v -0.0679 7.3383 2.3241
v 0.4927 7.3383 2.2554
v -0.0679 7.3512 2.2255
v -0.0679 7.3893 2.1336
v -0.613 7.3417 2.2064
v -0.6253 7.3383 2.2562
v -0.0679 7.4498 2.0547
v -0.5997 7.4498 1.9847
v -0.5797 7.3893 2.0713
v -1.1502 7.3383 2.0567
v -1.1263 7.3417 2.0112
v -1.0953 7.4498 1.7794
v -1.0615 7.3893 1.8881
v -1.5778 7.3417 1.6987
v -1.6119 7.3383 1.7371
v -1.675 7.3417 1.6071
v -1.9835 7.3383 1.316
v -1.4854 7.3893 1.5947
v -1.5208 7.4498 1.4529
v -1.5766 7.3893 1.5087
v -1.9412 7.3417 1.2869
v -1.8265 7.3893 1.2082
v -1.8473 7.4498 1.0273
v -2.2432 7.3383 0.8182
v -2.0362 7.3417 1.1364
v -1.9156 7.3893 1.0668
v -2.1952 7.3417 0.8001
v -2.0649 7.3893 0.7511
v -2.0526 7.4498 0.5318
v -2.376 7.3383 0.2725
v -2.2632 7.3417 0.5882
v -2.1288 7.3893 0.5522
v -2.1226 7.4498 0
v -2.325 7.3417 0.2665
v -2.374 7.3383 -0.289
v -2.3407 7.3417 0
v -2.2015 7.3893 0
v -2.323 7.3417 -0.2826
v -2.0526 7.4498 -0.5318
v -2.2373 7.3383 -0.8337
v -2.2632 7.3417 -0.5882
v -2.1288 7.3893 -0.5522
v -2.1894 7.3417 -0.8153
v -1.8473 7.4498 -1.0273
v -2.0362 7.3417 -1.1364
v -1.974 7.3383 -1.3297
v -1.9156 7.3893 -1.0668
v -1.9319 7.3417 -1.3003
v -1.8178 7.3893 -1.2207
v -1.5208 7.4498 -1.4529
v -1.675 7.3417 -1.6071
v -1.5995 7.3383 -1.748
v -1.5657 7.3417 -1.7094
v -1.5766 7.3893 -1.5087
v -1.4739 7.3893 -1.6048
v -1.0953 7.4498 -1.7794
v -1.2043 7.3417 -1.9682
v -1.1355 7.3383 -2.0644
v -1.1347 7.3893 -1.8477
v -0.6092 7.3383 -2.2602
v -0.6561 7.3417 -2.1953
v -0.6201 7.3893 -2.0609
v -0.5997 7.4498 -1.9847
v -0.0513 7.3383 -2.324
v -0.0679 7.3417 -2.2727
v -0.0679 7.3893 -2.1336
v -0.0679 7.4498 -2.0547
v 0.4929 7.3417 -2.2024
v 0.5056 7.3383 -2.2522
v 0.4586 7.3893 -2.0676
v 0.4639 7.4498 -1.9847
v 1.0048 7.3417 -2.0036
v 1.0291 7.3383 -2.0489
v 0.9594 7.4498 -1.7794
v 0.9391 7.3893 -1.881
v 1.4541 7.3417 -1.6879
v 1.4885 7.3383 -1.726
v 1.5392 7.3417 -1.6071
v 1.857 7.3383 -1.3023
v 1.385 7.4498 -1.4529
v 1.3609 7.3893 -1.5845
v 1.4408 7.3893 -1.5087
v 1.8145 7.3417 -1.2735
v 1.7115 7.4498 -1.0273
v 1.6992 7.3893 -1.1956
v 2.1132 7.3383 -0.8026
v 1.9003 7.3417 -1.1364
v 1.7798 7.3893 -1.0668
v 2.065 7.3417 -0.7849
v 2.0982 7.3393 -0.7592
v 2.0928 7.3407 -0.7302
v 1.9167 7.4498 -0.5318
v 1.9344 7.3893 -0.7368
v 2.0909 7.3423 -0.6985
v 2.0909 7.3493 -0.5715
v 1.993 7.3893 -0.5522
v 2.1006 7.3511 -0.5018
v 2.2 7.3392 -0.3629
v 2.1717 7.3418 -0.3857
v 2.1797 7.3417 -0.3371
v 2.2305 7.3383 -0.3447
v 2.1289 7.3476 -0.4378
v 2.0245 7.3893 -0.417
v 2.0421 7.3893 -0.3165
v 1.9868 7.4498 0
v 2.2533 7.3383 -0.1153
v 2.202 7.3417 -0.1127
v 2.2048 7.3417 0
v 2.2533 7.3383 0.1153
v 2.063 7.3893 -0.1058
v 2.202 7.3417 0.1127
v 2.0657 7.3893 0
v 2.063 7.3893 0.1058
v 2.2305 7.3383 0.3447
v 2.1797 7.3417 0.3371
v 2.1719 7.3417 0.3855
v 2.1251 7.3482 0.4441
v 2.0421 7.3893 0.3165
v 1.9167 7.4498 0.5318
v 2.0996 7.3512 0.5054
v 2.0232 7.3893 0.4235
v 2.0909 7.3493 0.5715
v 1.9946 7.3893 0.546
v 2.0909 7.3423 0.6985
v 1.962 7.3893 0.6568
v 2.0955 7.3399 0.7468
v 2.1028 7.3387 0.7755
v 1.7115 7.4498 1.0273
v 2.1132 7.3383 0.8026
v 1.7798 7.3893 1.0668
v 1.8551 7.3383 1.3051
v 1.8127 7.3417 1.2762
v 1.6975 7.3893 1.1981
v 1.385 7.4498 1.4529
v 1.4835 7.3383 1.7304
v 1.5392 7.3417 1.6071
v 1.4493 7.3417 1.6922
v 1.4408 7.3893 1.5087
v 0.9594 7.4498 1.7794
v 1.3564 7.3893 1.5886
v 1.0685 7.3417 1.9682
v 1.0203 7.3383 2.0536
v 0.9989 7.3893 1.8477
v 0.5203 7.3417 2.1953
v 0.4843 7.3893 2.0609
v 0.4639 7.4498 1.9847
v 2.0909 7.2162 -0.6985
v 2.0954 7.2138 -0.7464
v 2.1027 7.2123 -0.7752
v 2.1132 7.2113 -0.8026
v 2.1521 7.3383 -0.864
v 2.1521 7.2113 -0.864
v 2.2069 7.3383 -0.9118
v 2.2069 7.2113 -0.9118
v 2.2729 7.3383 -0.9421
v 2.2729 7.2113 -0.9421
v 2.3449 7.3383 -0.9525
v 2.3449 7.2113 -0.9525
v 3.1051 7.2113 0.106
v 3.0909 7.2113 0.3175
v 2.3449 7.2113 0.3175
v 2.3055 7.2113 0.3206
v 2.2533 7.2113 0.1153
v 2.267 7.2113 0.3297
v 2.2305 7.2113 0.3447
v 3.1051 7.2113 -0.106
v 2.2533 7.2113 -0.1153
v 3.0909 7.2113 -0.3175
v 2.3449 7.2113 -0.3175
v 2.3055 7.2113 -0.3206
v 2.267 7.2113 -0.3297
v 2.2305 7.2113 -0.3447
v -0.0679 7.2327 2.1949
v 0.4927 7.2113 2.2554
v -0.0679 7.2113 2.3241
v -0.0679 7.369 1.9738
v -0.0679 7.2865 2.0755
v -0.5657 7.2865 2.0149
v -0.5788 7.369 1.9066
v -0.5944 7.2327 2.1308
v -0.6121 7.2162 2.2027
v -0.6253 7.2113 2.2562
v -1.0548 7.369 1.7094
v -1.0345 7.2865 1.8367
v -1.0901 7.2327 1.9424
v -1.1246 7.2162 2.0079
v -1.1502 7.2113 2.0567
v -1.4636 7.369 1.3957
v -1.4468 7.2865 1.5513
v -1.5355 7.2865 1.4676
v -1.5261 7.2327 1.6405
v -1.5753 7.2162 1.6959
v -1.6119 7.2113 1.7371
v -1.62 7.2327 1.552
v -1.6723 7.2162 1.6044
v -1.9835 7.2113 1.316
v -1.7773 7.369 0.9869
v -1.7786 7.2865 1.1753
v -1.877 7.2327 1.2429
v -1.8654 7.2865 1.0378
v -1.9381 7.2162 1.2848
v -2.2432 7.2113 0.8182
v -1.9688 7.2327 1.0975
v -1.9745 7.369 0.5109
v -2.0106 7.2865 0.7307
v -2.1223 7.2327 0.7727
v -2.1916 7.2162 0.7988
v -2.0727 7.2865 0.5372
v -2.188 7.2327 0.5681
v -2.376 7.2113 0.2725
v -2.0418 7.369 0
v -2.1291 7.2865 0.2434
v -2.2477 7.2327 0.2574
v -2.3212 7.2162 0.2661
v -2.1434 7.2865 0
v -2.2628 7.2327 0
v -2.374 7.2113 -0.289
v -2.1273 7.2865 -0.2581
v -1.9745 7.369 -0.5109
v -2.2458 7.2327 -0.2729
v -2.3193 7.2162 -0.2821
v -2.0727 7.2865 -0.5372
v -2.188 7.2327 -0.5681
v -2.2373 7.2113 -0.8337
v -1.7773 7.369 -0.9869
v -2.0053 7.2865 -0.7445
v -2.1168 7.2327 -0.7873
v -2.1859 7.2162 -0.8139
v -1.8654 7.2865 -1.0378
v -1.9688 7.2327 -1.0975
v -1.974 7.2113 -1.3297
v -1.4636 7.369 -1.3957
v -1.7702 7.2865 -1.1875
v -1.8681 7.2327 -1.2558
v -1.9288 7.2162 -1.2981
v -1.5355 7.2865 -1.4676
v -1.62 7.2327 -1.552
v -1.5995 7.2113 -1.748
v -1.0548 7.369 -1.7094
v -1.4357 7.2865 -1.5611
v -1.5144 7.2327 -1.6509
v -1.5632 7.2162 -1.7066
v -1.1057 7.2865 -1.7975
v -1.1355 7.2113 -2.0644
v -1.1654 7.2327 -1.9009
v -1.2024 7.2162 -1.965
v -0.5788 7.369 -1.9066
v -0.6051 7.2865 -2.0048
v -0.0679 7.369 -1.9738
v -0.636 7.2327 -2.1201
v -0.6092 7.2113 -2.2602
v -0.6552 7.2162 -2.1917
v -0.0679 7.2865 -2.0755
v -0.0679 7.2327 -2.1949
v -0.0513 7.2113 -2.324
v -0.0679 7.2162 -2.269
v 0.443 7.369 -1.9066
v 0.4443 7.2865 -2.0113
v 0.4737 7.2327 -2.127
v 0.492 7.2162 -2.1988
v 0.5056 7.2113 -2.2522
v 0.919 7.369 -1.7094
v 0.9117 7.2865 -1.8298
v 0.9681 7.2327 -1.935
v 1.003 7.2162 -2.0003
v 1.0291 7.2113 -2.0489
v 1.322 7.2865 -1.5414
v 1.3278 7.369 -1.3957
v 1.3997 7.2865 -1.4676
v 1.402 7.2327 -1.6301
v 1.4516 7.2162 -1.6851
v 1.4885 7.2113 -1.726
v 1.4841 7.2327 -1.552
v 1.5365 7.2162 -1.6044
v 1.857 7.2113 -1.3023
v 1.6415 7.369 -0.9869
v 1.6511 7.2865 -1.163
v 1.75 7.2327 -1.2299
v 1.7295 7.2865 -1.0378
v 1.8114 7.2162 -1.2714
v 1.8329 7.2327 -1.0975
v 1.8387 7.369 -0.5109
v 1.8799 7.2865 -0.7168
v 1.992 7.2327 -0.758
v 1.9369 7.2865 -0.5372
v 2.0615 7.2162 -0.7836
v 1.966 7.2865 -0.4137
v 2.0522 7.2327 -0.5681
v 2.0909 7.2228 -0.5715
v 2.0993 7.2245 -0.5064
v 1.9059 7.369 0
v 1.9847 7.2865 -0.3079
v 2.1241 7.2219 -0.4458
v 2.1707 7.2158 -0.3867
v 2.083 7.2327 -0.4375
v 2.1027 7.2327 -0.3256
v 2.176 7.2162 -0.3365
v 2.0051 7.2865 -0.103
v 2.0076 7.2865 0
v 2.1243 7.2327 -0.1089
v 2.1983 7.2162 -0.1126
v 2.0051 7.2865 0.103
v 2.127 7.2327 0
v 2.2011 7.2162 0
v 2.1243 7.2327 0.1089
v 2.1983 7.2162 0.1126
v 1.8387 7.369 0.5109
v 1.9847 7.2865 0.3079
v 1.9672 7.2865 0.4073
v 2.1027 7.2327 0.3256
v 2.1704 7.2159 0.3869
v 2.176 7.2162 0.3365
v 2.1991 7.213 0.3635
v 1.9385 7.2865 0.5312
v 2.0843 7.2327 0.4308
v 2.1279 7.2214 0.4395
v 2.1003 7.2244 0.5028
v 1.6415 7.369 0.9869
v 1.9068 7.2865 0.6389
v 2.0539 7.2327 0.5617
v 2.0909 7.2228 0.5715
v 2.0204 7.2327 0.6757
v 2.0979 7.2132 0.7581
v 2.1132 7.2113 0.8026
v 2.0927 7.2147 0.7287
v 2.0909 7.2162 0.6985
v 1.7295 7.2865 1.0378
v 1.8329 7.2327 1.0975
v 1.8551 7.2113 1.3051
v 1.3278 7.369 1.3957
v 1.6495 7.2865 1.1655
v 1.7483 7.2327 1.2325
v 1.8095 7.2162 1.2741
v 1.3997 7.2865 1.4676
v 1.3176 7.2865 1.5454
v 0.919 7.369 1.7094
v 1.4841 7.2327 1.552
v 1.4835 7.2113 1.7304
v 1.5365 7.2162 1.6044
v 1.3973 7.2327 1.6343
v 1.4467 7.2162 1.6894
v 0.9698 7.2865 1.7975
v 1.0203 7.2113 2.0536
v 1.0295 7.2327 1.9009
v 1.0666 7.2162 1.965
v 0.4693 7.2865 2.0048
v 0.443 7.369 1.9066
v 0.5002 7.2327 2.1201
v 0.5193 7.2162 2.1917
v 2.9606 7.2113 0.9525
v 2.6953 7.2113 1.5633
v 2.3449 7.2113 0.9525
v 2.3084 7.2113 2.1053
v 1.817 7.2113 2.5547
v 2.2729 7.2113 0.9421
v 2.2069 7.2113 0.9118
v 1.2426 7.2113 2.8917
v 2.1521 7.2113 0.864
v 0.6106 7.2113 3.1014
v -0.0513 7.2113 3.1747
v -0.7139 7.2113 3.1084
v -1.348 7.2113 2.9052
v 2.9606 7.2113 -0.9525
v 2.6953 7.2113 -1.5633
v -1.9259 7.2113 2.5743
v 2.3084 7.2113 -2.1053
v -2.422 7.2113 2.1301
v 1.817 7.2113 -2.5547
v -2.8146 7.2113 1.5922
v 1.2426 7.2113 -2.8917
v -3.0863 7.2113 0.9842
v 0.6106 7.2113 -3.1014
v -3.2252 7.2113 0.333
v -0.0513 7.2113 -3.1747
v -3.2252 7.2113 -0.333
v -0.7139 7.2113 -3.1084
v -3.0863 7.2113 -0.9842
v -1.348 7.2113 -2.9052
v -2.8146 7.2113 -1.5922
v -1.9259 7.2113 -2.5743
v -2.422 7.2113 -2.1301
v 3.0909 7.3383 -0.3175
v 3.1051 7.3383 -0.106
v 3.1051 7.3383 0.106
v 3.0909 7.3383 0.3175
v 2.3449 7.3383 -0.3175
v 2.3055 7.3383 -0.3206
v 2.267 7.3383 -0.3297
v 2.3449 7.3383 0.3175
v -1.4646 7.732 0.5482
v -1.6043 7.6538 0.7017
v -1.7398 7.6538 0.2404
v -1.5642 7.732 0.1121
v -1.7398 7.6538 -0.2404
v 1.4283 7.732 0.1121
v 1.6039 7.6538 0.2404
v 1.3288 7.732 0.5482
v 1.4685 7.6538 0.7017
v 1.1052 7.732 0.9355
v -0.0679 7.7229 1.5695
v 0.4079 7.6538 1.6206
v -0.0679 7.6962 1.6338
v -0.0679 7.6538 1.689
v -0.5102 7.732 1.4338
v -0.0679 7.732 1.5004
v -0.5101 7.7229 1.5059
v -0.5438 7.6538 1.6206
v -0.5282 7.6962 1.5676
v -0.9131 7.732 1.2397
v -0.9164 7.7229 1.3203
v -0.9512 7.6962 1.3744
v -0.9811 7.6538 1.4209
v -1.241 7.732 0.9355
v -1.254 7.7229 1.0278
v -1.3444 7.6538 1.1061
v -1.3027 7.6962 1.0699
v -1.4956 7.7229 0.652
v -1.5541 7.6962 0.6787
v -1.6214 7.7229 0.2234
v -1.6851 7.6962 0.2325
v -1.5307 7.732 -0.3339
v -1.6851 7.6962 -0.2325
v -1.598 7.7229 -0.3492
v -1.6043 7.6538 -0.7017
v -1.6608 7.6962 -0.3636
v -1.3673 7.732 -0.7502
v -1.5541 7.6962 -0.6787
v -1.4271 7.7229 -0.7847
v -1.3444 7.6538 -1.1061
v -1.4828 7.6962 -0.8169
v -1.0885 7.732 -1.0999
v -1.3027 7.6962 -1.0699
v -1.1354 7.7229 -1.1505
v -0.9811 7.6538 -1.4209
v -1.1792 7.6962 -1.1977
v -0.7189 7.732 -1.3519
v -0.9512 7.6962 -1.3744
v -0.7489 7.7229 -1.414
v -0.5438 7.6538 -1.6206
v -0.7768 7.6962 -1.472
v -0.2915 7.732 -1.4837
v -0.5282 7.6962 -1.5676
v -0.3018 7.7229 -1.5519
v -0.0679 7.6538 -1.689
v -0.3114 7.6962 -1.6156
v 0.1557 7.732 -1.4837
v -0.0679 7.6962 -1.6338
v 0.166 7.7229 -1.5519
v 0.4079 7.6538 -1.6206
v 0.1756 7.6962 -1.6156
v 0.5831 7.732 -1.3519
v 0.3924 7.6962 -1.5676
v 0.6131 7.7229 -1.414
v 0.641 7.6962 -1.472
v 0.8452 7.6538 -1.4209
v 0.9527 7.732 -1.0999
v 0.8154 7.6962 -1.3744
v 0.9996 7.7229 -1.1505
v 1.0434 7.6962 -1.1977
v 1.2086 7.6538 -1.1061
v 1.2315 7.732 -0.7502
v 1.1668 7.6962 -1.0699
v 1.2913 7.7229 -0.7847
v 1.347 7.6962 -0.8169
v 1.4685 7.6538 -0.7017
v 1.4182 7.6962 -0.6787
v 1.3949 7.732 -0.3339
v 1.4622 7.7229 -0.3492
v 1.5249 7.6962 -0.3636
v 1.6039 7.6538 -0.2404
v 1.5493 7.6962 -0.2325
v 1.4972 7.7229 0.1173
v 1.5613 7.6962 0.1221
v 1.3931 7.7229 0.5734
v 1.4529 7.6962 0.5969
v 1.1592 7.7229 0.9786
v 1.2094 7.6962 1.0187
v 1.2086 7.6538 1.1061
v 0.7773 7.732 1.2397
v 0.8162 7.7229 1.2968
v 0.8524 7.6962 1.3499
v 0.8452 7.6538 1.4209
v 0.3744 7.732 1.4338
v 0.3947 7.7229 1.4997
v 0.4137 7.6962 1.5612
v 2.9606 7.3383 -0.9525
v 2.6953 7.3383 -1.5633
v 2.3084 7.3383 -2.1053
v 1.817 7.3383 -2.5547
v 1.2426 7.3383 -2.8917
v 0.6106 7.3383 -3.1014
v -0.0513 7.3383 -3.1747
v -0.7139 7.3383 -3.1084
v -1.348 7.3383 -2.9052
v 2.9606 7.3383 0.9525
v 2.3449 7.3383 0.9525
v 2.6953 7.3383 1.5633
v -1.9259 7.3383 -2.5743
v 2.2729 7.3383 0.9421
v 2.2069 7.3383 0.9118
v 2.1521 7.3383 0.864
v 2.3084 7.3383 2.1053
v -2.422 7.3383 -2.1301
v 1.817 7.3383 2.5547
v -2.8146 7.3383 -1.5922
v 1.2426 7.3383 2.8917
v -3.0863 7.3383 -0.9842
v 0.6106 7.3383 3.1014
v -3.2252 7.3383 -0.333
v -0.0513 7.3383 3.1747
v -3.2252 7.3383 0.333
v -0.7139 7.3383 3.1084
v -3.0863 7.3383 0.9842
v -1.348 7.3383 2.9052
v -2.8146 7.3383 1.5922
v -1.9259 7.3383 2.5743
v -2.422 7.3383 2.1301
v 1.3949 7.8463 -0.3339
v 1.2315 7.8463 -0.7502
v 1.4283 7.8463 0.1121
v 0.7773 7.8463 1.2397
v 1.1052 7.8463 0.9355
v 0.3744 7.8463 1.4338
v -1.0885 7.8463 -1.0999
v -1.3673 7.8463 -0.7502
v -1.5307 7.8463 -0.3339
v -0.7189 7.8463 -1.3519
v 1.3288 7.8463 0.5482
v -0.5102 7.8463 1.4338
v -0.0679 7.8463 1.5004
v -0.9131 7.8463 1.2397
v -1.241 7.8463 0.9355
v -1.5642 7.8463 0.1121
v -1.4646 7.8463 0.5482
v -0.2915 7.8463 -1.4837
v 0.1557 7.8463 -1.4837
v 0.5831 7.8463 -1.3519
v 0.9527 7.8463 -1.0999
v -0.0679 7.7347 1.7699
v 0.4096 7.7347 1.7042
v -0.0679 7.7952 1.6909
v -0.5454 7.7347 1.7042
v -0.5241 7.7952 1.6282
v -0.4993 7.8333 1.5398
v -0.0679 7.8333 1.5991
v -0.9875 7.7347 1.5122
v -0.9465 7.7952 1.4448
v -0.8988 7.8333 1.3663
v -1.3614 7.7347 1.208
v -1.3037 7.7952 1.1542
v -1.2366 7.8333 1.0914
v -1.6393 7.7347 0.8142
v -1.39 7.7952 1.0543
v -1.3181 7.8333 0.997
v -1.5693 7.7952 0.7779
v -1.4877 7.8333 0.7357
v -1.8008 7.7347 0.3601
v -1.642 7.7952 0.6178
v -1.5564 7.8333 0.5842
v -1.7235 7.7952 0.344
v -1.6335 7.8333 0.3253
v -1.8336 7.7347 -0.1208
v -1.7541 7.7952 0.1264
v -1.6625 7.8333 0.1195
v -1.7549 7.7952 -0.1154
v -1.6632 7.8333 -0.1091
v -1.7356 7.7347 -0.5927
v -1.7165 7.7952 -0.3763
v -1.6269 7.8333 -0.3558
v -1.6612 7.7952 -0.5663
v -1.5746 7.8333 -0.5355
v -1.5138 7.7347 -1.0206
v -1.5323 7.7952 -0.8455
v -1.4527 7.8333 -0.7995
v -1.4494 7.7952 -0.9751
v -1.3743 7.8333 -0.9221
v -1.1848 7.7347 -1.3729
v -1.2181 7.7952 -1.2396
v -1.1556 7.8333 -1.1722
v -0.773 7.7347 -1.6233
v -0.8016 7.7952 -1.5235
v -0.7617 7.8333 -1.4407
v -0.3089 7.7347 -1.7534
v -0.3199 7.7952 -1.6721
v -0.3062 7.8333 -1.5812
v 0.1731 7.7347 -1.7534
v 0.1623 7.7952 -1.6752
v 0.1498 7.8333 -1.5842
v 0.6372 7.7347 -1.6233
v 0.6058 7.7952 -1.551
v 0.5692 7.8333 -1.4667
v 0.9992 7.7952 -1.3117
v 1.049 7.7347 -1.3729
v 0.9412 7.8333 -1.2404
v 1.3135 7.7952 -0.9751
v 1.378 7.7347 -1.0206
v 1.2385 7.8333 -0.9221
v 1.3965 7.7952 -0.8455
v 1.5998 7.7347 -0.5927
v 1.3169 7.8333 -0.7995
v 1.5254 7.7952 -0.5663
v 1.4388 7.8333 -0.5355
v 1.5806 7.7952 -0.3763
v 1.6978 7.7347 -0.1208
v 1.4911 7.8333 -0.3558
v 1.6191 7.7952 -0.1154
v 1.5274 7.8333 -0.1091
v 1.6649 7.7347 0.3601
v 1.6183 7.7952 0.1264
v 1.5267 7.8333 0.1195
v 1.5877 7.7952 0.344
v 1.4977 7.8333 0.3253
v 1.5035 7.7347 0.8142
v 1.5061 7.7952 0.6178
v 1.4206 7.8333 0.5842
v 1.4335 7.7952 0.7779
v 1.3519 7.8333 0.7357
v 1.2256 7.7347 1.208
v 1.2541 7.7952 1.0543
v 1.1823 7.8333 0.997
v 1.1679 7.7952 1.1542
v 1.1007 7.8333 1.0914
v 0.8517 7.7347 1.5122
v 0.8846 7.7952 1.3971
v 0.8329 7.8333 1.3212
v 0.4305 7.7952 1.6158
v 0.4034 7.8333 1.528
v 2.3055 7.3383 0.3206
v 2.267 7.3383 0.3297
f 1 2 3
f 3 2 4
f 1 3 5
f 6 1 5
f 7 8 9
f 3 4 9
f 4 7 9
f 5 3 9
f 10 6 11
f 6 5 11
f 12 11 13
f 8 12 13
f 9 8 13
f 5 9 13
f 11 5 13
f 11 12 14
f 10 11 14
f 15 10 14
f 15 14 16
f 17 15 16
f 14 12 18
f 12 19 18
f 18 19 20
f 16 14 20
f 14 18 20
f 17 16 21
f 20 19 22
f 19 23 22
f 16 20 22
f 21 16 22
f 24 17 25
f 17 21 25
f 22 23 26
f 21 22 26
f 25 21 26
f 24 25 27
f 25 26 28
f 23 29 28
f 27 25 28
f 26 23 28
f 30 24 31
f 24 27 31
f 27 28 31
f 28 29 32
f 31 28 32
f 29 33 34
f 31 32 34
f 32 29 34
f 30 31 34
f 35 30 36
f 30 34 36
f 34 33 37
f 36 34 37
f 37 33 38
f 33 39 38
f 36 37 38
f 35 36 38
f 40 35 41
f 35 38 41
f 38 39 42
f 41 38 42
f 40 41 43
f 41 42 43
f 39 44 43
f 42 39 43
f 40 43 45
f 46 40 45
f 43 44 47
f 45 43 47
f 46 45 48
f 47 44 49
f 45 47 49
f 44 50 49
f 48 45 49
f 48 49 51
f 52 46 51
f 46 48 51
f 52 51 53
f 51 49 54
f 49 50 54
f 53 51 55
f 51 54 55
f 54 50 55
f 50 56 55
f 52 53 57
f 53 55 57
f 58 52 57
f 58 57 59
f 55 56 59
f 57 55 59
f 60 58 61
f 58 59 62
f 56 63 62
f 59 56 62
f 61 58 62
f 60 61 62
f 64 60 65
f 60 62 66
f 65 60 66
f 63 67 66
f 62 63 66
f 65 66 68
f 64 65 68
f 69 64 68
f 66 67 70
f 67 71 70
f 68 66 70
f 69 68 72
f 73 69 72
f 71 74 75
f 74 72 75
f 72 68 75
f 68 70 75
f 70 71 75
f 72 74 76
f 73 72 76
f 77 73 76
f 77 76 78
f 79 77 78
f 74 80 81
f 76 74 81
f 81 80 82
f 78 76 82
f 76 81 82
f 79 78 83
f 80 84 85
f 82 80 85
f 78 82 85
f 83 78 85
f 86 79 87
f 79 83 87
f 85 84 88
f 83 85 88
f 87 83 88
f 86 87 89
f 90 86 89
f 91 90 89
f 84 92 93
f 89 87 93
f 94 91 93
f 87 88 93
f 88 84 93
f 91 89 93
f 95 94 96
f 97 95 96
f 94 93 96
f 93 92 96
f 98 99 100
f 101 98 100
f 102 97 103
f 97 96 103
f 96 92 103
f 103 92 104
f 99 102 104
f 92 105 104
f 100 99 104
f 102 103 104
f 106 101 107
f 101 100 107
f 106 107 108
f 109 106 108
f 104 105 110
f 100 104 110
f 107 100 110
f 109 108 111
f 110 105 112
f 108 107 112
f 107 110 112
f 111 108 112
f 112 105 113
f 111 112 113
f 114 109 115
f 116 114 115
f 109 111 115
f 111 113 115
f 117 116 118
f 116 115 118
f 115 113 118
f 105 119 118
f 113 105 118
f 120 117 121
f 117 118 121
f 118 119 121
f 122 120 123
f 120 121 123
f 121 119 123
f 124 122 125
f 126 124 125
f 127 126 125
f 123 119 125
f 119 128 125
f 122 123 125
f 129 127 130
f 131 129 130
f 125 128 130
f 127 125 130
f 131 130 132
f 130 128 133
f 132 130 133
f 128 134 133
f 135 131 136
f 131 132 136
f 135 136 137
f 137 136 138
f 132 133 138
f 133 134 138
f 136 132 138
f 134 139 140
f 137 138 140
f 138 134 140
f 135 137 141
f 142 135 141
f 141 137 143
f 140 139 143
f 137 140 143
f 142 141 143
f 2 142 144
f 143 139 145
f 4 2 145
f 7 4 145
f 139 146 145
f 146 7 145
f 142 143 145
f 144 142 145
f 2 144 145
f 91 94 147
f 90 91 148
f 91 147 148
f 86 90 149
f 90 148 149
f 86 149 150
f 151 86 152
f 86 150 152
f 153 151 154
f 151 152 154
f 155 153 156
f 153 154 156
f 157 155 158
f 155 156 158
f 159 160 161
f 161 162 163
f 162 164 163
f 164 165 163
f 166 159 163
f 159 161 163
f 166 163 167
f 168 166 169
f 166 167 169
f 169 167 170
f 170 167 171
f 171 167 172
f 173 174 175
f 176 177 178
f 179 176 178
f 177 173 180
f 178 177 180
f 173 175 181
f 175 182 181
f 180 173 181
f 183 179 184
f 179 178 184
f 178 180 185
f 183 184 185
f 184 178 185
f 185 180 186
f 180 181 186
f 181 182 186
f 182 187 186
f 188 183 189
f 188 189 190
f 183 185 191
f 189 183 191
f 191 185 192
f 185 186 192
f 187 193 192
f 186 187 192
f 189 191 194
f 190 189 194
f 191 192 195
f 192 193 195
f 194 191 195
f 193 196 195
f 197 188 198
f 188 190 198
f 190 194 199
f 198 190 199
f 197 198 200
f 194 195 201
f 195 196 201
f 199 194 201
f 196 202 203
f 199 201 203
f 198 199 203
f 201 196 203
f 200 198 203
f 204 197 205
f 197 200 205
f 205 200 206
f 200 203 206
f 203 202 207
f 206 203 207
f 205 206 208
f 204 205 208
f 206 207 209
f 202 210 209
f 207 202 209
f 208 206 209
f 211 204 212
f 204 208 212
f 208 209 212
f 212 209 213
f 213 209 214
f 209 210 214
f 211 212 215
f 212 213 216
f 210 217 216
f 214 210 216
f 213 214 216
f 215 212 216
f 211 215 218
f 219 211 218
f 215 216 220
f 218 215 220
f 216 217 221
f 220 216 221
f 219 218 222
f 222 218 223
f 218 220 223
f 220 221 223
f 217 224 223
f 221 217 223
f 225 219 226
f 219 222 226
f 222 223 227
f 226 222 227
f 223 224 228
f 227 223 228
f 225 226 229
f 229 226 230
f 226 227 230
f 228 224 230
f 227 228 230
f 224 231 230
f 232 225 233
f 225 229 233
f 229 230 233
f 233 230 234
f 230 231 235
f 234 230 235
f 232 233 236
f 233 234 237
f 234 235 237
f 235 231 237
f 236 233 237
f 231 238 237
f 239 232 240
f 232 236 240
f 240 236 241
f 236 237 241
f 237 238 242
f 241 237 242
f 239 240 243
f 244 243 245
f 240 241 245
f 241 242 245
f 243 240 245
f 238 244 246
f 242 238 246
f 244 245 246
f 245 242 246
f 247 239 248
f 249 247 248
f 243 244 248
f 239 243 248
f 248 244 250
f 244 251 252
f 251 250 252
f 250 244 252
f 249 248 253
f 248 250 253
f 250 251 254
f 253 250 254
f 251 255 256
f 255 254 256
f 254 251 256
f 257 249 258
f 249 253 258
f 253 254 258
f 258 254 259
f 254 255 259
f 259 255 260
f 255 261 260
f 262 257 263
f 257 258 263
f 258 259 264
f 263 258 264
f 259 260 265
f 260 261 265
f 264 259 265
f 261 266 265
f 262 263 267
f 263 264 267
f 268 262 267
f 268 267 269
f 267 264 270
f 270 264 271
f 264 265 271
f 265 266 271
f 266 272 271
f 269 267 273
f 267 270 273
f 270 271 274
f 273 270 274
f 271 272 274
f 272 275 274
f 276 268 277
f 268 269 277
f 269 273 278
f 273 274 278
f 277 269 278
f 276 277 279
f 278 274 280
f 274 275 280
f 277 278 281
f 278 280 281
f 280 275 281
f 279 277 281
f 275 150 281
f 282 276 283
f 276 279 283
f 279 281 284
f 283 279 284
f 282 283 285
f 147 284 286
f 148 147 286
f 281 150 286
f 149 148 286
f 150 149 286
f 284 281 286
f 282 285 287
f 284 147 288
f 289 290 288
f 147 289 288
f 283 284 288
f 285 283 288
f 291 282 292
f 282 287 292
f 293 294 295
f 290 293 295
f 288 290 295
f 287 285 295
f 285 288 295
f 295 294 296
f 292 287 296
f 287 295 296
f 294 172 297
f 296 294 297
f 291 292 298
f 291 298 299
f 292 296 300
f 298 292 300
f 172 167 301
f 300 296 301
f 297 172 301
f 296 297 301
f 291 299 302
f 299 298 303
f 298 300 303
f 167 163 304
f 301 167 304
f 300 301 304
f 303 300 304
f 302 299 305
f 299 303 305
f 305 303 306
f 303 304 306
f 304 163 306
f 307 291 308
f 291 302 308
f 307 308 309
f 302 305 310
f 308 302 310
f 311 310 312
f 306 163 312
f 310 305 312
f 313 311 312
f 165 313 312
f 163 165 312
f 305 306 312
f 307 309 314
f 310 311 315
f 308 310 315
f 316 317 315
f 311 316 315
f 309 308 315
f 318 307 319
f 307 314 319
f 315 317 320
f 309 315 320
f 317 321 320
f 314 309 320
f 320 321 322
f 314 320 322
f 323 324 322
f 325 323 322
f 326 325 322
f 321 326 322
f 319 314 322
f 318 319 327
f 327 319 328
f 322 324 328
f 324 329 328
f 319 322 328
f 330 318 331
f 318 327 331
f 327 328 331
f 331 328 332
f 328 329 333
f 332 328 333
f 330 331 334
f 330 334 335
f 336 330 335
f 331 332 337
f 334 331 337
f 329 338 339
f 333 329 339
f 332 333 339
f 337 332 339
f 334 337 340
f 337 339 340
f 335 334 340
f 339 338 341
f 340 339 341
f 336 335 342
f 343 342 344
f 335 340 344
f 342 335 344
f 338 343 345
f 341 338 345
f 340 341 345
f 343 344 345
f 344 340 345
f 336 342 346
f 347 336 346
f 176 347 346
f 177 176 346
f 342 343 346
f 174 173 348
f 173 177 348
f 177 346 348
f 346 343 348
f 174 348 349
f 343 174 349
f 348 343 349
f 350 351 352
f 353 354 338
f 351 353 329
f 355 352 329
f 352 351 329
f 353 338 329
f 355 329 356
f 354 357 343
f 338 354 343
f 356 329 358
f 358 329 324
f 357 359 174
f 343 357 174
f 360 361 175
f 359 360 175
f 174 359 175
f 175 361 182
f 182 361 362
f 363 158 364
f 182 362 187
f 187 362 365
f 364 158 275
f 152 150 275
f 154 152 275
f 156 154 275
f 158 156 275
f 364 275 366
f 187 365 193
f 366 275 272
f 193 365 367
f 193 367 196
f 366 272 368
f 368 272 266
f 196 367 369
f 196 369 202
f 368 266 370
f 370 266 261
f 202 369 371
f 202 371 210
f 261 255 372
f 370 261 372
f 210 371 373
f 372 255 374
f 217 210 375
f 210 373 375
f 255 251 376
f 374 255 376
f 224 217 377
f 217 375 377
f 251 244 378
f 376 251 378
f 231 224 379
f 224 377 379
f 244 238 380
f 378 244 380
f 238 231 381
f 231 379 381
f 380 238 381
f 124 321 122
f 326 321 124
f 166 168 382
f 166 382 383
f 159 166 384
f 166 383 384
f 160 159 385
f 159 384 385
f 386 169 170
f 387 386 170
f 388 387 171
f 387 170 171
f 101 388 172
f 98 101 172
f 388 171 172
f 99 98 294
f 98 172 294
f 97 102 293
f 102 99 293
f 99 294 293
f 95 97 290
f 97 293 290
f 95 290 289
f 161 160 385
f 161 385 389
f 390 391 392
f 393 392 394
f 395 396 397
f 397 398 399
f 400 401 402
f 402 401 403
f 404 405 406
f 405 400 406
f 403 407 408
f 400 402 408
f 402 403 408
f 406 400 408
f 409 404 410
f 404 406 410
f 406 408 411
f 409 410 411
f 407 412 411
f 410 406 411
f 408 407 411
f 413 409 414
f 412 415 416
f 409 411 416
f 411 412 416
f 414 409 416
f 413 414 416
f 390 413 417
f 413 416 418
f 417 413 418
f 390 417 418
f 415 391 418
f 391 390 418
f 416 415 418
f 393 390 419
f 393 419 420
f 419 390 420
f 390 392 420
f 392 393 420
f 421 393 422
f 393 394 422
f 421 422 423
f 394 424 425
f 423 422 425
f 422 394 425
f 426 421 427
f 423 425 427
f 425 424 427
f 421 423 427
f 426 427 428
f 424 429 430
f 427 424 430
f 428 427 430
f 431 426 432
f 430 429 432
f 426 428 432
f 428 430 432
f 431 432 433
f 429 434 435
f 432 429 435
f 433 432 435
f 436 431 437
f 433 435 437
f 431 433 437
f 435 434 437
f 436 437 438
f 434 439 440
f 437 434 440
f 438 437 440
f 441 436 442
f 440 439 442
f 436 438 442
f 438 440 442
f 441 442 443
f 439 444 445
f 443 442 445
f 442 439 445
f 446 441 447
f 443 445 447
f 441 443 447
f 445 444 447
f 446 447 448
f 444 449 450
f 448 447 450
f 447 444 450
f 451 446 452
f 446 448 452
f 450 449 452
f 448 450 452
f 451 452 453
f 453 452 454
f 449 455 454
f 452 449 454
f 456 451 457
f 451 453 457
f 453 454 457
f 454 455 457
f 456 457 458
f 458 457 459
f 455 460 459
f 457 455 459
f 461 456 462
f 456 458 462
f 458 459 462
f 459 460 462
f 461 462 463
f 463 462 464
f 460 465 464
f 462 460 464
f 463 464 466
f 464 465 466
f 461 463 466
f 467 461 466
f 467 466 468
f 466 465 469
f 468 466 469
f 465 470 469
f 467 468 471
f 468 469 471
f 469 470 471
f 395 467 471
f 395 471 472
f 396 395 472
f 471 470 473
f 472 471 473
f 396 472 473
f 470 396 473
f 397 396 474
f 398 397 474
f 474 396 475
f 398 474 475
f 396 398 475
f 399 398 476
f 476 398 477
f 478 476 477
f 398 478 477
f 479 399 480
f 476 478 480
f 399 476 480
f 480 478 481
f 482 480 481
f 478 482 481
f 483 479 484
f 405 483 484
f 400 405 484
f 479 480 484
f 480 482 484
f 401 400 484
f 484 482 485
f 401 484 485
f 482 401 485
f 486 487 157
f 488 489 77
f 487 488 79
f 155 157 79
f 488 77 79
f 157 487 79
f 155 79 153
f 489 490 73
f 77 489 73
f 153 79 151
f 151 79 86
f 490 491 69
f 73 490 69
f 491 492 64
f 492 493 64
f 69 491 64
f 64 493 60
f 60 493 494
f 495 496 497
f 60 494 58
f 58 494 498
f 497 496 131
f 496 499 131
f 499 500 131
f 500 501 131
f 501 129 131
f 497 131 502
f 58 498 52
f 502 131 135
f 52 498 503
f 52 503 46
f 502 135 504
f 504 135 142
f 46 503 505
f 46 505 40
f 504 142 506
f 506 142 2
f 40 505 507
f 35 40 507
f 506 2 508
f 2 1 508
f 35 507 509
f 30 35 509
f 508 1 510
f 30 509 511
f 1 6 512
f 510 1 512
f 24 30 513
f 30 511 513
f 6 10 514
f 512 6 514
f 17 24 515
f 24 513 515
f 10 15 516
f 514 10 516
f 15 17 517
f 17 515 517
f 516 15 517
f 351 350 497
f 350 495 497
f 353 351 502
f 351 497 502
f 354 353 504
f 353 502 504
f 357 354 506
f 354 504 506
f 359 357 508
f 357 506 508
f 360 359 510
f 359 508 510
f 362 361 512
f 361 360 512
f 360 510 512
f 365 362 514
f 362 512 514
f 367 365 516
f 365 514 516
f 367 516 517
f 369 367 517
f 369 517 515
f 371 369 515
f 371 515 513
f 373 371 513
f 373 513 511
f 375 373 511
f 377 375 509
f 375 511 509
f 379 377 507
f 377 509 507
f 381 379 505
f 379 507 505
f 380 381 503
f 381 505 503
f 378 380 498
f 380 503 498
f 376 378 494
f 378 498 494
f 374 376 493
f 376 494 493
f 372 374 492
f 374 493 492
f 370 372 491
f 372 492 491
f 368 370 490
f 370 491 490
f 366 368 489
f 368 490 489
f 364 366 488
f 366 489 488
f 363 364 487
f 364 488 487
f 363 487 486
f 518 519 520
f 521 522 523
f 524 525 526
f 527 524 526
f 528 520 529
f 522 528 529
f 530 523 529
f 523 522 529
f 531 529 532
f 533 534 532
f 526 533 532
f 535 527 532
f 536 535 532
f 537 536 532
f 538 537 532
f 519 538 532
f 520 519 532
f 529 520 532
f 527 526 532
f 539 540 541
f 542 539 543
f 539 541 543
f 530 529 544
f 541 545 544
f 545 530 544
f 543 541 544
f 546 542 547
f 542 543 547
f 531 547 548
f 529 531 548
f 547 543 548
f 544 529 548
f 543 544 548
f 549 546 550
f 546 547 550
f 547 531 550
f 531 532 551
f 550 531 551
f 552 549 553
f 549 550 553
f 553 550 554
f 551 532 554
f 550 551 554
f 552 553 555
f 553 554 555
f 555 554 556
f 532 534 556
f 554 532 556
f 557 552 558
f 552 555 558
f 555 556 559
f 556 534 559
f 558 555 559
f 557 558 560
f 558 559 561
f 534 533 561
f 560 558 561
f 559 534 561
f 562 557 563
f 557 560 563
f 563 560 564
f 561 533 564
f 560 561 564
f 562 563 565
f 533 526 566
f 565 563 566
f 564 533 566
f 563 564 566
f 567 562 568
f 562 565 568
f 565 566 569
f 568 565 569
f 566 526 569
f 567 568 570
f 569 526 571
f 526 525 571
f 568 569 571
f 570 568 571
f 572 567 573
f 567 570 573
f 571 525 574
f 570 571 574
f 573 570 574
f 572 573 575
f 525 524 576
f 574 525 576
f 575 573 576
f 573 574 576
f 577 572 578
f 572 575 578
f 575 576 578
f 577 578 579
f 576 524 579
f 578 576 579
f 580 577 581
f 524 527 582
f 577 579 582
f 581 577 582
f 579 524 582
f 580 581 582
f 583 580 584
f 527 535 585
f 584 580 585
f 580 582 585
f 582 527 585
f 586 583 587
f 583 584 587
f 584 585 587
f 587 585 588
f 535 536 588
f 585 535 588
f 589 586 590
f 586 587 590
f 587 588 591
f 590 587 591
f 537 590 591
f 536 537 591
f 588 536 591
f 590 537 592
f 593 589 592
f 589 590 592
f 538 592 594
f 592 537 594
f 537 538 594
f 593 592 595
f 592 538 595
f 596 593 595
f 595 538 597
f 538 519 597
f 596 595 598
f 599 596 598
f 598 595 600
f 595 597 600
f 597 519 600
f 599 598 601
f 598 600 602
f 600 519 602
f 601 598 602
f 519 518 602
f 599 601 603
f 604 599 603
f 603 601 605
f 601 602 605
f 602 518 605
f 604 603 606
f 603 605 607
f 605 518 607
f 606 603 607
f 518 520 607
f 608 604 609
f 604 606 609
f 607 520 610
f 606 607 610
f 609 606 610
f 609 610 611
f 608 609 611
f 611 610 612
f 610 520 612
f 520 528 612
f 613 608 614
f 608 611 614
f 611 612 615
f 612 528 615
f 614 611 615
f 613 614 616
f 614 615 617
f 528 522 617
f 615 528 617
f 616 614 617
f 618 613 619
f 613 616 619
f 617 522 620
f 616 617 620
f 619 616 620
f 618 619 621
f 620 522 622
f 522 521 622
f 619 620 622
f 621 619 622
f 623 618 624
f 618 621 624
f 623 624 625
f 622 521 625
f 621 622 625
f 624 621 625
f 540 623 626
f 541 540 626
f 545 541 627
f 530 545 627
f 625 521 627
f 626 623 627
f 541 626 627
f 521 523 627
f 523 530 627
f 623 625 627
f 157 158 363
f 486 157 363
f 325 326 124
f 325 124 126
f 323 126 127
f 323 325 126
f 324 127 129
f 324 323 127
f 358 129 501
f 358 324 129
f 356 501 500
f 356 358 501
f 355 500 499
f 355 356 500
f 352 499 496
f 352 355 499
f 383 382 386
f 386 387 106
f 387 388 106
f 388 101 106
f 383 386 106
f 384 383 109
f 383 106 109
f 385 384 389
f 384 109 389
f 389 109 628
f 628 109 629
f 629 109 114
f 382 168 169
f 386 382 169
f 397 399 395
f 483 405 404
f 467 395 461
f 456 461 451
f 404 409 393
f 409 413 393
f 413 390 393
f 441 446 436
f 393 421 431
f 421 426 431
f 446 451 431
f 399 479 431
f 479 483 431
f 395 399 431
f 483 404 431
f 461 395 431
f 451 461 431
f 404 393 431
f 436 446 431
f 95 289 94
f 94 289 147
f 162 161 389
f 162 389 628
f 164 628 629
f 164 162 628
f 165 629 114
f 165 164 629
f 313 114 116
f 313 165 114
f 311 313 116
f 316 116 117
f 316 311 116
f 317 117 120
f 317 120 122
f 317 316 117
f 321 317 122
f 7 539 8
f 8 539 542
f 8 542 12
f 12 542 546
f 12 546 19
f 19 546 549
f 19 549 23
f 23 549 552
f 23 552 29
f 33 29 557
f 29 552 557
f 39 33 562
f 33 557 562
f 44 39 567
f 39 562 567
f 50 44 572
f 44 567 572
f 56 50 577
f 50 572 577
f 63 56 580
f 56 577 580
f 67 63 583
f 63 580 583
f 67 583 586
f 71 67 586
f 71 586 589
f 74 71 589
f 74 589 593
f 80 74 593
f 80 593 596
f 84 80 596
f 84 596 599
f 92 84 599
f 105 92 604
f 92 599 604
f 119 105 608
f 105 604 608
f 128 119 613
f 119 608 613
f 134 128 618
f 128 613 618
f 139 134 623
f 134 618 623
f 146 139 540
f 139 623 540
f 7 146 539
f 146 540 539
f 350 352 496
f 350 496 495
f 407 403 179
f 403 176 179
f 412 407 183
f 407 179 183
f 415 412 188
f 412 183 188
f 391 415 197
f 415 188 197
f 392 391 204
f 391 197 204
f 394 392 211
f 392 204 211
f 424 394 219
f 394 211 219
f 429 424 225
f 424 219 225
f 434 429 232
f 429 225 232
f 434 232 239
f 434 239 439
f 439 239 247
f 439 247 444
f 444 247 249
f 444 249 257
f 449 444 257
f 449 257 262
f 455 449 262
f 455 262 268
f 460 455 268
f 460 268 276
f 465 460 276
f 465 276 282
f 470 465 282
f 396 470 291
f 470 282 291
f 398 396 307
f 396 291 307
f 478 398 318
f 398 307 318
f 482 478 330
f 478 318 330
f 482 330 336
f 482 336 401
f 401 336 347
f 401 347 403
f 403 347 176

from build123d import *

# Parameters (mm, degrees)
CUT_EXTRUDE1_DEPTH = 5.582296376


with BuildPart() as part:
    # Sketch1 → Revolve2 (revolve)
    with BuildSketch(Plane.XY, mode=Mode.PRIVATE) as revolve2_sk:
        with BuildLine():
            Line((1.432534745, 7.84625121), (-0.067914271, 7.84625121))
            Line((-0.067914271, 7.84625121), (-0.067914271, 7.73195121))
            Line((-0.067914271, 7.73195121), (1.432534745, 7.73195121))
            ThreePointArc((1.432534745, 7.73195121), (1.534596416, 7.711649881), (1.621120123, 7.653836588))
            Line((1.621120123, 7.653836588), (1.90593549, 7.369021221))
            ThreePointArc((1.90593549, 7.369021221), (2.065565133, 7.255760643), (2.256165479, 7.21125121))
            Line((2.256165479, 7.21125121), (3.106859566, 7.21125121))
            Line((3.106859566, 7.21125121), (3.106859566, 7.33825121))
            Line((3.106859566, 7.33825121), (2.256165479, 7.33825121))
            ThreePointArc((2.256165479, 7.33825121), (2.110363091, 7.367253108), (1.986757795, 7.449843526))
            Line((1.986757795, 7.449843526), (1.701942428, 7.734658893))
            ThreePointArc((1.701942428, 7.734658893), (1.578337132, 7.817249312), (1.432534745, 7.84625121))
        make_face()
    revolve(revolve2_sk.sketch.rotate(Axis((-0.067914271, 7.84625121, 0), (0, -1, 0)), 90), axis=Axis((-0.067914271, 7.84625121, 0), (0, -1, 0)))

    # Sketch2 → Cut-Extrude1 (cut, through all)
    with BuildSketch(Plane.XZ.offset(-7.21125121)):
        with BuildLine():
            Line((2.090859566, -0.5715), (2.090859566, -0.6985))
            ThreePointArc((2.090859566, -0.6985), (2.165254443, -0.878105122), (2.344859566, -0.9525))
            Line((2.344859566, -0.9525), (3.634475543, -0.9525))
            Line((3.634475543, -0.9525), (3.634475543, -0.3175))
            Line((3.634475543, -0.3175), (2.344859566, -0.3175))
            ThreePointArc((2.344859566, -0.3175), (2.165254443, -0.391894878), (2.090859566, -0.5715))
        make_face()
        with BuildLine():
            Line((2.344859566, 0.9525), (3.634475543, 0.9525))
            Line((3.634475543, 0.9525), (3.634475543, 0.3175))
            Line((3.634475543, 0.3175), (2.344859566, 0.3175))
            ThreePointArc((2.344859566, 0.3175), (2.165254443, 0.391894878), (2.090859566, 0.5715))
            Line((2.090859566, 0.5715), (2.090859566, 0.6985))
            ThreePointArc((2.090859566, 0.6985), (2.165254443, 0.878105122), (2.344859566, 0.9525))
        make_face()
    extrude(amount=-CUT_EXTRUDE1_DEPTH, mode=Mode.SUBTRACT)


solid = part.part
